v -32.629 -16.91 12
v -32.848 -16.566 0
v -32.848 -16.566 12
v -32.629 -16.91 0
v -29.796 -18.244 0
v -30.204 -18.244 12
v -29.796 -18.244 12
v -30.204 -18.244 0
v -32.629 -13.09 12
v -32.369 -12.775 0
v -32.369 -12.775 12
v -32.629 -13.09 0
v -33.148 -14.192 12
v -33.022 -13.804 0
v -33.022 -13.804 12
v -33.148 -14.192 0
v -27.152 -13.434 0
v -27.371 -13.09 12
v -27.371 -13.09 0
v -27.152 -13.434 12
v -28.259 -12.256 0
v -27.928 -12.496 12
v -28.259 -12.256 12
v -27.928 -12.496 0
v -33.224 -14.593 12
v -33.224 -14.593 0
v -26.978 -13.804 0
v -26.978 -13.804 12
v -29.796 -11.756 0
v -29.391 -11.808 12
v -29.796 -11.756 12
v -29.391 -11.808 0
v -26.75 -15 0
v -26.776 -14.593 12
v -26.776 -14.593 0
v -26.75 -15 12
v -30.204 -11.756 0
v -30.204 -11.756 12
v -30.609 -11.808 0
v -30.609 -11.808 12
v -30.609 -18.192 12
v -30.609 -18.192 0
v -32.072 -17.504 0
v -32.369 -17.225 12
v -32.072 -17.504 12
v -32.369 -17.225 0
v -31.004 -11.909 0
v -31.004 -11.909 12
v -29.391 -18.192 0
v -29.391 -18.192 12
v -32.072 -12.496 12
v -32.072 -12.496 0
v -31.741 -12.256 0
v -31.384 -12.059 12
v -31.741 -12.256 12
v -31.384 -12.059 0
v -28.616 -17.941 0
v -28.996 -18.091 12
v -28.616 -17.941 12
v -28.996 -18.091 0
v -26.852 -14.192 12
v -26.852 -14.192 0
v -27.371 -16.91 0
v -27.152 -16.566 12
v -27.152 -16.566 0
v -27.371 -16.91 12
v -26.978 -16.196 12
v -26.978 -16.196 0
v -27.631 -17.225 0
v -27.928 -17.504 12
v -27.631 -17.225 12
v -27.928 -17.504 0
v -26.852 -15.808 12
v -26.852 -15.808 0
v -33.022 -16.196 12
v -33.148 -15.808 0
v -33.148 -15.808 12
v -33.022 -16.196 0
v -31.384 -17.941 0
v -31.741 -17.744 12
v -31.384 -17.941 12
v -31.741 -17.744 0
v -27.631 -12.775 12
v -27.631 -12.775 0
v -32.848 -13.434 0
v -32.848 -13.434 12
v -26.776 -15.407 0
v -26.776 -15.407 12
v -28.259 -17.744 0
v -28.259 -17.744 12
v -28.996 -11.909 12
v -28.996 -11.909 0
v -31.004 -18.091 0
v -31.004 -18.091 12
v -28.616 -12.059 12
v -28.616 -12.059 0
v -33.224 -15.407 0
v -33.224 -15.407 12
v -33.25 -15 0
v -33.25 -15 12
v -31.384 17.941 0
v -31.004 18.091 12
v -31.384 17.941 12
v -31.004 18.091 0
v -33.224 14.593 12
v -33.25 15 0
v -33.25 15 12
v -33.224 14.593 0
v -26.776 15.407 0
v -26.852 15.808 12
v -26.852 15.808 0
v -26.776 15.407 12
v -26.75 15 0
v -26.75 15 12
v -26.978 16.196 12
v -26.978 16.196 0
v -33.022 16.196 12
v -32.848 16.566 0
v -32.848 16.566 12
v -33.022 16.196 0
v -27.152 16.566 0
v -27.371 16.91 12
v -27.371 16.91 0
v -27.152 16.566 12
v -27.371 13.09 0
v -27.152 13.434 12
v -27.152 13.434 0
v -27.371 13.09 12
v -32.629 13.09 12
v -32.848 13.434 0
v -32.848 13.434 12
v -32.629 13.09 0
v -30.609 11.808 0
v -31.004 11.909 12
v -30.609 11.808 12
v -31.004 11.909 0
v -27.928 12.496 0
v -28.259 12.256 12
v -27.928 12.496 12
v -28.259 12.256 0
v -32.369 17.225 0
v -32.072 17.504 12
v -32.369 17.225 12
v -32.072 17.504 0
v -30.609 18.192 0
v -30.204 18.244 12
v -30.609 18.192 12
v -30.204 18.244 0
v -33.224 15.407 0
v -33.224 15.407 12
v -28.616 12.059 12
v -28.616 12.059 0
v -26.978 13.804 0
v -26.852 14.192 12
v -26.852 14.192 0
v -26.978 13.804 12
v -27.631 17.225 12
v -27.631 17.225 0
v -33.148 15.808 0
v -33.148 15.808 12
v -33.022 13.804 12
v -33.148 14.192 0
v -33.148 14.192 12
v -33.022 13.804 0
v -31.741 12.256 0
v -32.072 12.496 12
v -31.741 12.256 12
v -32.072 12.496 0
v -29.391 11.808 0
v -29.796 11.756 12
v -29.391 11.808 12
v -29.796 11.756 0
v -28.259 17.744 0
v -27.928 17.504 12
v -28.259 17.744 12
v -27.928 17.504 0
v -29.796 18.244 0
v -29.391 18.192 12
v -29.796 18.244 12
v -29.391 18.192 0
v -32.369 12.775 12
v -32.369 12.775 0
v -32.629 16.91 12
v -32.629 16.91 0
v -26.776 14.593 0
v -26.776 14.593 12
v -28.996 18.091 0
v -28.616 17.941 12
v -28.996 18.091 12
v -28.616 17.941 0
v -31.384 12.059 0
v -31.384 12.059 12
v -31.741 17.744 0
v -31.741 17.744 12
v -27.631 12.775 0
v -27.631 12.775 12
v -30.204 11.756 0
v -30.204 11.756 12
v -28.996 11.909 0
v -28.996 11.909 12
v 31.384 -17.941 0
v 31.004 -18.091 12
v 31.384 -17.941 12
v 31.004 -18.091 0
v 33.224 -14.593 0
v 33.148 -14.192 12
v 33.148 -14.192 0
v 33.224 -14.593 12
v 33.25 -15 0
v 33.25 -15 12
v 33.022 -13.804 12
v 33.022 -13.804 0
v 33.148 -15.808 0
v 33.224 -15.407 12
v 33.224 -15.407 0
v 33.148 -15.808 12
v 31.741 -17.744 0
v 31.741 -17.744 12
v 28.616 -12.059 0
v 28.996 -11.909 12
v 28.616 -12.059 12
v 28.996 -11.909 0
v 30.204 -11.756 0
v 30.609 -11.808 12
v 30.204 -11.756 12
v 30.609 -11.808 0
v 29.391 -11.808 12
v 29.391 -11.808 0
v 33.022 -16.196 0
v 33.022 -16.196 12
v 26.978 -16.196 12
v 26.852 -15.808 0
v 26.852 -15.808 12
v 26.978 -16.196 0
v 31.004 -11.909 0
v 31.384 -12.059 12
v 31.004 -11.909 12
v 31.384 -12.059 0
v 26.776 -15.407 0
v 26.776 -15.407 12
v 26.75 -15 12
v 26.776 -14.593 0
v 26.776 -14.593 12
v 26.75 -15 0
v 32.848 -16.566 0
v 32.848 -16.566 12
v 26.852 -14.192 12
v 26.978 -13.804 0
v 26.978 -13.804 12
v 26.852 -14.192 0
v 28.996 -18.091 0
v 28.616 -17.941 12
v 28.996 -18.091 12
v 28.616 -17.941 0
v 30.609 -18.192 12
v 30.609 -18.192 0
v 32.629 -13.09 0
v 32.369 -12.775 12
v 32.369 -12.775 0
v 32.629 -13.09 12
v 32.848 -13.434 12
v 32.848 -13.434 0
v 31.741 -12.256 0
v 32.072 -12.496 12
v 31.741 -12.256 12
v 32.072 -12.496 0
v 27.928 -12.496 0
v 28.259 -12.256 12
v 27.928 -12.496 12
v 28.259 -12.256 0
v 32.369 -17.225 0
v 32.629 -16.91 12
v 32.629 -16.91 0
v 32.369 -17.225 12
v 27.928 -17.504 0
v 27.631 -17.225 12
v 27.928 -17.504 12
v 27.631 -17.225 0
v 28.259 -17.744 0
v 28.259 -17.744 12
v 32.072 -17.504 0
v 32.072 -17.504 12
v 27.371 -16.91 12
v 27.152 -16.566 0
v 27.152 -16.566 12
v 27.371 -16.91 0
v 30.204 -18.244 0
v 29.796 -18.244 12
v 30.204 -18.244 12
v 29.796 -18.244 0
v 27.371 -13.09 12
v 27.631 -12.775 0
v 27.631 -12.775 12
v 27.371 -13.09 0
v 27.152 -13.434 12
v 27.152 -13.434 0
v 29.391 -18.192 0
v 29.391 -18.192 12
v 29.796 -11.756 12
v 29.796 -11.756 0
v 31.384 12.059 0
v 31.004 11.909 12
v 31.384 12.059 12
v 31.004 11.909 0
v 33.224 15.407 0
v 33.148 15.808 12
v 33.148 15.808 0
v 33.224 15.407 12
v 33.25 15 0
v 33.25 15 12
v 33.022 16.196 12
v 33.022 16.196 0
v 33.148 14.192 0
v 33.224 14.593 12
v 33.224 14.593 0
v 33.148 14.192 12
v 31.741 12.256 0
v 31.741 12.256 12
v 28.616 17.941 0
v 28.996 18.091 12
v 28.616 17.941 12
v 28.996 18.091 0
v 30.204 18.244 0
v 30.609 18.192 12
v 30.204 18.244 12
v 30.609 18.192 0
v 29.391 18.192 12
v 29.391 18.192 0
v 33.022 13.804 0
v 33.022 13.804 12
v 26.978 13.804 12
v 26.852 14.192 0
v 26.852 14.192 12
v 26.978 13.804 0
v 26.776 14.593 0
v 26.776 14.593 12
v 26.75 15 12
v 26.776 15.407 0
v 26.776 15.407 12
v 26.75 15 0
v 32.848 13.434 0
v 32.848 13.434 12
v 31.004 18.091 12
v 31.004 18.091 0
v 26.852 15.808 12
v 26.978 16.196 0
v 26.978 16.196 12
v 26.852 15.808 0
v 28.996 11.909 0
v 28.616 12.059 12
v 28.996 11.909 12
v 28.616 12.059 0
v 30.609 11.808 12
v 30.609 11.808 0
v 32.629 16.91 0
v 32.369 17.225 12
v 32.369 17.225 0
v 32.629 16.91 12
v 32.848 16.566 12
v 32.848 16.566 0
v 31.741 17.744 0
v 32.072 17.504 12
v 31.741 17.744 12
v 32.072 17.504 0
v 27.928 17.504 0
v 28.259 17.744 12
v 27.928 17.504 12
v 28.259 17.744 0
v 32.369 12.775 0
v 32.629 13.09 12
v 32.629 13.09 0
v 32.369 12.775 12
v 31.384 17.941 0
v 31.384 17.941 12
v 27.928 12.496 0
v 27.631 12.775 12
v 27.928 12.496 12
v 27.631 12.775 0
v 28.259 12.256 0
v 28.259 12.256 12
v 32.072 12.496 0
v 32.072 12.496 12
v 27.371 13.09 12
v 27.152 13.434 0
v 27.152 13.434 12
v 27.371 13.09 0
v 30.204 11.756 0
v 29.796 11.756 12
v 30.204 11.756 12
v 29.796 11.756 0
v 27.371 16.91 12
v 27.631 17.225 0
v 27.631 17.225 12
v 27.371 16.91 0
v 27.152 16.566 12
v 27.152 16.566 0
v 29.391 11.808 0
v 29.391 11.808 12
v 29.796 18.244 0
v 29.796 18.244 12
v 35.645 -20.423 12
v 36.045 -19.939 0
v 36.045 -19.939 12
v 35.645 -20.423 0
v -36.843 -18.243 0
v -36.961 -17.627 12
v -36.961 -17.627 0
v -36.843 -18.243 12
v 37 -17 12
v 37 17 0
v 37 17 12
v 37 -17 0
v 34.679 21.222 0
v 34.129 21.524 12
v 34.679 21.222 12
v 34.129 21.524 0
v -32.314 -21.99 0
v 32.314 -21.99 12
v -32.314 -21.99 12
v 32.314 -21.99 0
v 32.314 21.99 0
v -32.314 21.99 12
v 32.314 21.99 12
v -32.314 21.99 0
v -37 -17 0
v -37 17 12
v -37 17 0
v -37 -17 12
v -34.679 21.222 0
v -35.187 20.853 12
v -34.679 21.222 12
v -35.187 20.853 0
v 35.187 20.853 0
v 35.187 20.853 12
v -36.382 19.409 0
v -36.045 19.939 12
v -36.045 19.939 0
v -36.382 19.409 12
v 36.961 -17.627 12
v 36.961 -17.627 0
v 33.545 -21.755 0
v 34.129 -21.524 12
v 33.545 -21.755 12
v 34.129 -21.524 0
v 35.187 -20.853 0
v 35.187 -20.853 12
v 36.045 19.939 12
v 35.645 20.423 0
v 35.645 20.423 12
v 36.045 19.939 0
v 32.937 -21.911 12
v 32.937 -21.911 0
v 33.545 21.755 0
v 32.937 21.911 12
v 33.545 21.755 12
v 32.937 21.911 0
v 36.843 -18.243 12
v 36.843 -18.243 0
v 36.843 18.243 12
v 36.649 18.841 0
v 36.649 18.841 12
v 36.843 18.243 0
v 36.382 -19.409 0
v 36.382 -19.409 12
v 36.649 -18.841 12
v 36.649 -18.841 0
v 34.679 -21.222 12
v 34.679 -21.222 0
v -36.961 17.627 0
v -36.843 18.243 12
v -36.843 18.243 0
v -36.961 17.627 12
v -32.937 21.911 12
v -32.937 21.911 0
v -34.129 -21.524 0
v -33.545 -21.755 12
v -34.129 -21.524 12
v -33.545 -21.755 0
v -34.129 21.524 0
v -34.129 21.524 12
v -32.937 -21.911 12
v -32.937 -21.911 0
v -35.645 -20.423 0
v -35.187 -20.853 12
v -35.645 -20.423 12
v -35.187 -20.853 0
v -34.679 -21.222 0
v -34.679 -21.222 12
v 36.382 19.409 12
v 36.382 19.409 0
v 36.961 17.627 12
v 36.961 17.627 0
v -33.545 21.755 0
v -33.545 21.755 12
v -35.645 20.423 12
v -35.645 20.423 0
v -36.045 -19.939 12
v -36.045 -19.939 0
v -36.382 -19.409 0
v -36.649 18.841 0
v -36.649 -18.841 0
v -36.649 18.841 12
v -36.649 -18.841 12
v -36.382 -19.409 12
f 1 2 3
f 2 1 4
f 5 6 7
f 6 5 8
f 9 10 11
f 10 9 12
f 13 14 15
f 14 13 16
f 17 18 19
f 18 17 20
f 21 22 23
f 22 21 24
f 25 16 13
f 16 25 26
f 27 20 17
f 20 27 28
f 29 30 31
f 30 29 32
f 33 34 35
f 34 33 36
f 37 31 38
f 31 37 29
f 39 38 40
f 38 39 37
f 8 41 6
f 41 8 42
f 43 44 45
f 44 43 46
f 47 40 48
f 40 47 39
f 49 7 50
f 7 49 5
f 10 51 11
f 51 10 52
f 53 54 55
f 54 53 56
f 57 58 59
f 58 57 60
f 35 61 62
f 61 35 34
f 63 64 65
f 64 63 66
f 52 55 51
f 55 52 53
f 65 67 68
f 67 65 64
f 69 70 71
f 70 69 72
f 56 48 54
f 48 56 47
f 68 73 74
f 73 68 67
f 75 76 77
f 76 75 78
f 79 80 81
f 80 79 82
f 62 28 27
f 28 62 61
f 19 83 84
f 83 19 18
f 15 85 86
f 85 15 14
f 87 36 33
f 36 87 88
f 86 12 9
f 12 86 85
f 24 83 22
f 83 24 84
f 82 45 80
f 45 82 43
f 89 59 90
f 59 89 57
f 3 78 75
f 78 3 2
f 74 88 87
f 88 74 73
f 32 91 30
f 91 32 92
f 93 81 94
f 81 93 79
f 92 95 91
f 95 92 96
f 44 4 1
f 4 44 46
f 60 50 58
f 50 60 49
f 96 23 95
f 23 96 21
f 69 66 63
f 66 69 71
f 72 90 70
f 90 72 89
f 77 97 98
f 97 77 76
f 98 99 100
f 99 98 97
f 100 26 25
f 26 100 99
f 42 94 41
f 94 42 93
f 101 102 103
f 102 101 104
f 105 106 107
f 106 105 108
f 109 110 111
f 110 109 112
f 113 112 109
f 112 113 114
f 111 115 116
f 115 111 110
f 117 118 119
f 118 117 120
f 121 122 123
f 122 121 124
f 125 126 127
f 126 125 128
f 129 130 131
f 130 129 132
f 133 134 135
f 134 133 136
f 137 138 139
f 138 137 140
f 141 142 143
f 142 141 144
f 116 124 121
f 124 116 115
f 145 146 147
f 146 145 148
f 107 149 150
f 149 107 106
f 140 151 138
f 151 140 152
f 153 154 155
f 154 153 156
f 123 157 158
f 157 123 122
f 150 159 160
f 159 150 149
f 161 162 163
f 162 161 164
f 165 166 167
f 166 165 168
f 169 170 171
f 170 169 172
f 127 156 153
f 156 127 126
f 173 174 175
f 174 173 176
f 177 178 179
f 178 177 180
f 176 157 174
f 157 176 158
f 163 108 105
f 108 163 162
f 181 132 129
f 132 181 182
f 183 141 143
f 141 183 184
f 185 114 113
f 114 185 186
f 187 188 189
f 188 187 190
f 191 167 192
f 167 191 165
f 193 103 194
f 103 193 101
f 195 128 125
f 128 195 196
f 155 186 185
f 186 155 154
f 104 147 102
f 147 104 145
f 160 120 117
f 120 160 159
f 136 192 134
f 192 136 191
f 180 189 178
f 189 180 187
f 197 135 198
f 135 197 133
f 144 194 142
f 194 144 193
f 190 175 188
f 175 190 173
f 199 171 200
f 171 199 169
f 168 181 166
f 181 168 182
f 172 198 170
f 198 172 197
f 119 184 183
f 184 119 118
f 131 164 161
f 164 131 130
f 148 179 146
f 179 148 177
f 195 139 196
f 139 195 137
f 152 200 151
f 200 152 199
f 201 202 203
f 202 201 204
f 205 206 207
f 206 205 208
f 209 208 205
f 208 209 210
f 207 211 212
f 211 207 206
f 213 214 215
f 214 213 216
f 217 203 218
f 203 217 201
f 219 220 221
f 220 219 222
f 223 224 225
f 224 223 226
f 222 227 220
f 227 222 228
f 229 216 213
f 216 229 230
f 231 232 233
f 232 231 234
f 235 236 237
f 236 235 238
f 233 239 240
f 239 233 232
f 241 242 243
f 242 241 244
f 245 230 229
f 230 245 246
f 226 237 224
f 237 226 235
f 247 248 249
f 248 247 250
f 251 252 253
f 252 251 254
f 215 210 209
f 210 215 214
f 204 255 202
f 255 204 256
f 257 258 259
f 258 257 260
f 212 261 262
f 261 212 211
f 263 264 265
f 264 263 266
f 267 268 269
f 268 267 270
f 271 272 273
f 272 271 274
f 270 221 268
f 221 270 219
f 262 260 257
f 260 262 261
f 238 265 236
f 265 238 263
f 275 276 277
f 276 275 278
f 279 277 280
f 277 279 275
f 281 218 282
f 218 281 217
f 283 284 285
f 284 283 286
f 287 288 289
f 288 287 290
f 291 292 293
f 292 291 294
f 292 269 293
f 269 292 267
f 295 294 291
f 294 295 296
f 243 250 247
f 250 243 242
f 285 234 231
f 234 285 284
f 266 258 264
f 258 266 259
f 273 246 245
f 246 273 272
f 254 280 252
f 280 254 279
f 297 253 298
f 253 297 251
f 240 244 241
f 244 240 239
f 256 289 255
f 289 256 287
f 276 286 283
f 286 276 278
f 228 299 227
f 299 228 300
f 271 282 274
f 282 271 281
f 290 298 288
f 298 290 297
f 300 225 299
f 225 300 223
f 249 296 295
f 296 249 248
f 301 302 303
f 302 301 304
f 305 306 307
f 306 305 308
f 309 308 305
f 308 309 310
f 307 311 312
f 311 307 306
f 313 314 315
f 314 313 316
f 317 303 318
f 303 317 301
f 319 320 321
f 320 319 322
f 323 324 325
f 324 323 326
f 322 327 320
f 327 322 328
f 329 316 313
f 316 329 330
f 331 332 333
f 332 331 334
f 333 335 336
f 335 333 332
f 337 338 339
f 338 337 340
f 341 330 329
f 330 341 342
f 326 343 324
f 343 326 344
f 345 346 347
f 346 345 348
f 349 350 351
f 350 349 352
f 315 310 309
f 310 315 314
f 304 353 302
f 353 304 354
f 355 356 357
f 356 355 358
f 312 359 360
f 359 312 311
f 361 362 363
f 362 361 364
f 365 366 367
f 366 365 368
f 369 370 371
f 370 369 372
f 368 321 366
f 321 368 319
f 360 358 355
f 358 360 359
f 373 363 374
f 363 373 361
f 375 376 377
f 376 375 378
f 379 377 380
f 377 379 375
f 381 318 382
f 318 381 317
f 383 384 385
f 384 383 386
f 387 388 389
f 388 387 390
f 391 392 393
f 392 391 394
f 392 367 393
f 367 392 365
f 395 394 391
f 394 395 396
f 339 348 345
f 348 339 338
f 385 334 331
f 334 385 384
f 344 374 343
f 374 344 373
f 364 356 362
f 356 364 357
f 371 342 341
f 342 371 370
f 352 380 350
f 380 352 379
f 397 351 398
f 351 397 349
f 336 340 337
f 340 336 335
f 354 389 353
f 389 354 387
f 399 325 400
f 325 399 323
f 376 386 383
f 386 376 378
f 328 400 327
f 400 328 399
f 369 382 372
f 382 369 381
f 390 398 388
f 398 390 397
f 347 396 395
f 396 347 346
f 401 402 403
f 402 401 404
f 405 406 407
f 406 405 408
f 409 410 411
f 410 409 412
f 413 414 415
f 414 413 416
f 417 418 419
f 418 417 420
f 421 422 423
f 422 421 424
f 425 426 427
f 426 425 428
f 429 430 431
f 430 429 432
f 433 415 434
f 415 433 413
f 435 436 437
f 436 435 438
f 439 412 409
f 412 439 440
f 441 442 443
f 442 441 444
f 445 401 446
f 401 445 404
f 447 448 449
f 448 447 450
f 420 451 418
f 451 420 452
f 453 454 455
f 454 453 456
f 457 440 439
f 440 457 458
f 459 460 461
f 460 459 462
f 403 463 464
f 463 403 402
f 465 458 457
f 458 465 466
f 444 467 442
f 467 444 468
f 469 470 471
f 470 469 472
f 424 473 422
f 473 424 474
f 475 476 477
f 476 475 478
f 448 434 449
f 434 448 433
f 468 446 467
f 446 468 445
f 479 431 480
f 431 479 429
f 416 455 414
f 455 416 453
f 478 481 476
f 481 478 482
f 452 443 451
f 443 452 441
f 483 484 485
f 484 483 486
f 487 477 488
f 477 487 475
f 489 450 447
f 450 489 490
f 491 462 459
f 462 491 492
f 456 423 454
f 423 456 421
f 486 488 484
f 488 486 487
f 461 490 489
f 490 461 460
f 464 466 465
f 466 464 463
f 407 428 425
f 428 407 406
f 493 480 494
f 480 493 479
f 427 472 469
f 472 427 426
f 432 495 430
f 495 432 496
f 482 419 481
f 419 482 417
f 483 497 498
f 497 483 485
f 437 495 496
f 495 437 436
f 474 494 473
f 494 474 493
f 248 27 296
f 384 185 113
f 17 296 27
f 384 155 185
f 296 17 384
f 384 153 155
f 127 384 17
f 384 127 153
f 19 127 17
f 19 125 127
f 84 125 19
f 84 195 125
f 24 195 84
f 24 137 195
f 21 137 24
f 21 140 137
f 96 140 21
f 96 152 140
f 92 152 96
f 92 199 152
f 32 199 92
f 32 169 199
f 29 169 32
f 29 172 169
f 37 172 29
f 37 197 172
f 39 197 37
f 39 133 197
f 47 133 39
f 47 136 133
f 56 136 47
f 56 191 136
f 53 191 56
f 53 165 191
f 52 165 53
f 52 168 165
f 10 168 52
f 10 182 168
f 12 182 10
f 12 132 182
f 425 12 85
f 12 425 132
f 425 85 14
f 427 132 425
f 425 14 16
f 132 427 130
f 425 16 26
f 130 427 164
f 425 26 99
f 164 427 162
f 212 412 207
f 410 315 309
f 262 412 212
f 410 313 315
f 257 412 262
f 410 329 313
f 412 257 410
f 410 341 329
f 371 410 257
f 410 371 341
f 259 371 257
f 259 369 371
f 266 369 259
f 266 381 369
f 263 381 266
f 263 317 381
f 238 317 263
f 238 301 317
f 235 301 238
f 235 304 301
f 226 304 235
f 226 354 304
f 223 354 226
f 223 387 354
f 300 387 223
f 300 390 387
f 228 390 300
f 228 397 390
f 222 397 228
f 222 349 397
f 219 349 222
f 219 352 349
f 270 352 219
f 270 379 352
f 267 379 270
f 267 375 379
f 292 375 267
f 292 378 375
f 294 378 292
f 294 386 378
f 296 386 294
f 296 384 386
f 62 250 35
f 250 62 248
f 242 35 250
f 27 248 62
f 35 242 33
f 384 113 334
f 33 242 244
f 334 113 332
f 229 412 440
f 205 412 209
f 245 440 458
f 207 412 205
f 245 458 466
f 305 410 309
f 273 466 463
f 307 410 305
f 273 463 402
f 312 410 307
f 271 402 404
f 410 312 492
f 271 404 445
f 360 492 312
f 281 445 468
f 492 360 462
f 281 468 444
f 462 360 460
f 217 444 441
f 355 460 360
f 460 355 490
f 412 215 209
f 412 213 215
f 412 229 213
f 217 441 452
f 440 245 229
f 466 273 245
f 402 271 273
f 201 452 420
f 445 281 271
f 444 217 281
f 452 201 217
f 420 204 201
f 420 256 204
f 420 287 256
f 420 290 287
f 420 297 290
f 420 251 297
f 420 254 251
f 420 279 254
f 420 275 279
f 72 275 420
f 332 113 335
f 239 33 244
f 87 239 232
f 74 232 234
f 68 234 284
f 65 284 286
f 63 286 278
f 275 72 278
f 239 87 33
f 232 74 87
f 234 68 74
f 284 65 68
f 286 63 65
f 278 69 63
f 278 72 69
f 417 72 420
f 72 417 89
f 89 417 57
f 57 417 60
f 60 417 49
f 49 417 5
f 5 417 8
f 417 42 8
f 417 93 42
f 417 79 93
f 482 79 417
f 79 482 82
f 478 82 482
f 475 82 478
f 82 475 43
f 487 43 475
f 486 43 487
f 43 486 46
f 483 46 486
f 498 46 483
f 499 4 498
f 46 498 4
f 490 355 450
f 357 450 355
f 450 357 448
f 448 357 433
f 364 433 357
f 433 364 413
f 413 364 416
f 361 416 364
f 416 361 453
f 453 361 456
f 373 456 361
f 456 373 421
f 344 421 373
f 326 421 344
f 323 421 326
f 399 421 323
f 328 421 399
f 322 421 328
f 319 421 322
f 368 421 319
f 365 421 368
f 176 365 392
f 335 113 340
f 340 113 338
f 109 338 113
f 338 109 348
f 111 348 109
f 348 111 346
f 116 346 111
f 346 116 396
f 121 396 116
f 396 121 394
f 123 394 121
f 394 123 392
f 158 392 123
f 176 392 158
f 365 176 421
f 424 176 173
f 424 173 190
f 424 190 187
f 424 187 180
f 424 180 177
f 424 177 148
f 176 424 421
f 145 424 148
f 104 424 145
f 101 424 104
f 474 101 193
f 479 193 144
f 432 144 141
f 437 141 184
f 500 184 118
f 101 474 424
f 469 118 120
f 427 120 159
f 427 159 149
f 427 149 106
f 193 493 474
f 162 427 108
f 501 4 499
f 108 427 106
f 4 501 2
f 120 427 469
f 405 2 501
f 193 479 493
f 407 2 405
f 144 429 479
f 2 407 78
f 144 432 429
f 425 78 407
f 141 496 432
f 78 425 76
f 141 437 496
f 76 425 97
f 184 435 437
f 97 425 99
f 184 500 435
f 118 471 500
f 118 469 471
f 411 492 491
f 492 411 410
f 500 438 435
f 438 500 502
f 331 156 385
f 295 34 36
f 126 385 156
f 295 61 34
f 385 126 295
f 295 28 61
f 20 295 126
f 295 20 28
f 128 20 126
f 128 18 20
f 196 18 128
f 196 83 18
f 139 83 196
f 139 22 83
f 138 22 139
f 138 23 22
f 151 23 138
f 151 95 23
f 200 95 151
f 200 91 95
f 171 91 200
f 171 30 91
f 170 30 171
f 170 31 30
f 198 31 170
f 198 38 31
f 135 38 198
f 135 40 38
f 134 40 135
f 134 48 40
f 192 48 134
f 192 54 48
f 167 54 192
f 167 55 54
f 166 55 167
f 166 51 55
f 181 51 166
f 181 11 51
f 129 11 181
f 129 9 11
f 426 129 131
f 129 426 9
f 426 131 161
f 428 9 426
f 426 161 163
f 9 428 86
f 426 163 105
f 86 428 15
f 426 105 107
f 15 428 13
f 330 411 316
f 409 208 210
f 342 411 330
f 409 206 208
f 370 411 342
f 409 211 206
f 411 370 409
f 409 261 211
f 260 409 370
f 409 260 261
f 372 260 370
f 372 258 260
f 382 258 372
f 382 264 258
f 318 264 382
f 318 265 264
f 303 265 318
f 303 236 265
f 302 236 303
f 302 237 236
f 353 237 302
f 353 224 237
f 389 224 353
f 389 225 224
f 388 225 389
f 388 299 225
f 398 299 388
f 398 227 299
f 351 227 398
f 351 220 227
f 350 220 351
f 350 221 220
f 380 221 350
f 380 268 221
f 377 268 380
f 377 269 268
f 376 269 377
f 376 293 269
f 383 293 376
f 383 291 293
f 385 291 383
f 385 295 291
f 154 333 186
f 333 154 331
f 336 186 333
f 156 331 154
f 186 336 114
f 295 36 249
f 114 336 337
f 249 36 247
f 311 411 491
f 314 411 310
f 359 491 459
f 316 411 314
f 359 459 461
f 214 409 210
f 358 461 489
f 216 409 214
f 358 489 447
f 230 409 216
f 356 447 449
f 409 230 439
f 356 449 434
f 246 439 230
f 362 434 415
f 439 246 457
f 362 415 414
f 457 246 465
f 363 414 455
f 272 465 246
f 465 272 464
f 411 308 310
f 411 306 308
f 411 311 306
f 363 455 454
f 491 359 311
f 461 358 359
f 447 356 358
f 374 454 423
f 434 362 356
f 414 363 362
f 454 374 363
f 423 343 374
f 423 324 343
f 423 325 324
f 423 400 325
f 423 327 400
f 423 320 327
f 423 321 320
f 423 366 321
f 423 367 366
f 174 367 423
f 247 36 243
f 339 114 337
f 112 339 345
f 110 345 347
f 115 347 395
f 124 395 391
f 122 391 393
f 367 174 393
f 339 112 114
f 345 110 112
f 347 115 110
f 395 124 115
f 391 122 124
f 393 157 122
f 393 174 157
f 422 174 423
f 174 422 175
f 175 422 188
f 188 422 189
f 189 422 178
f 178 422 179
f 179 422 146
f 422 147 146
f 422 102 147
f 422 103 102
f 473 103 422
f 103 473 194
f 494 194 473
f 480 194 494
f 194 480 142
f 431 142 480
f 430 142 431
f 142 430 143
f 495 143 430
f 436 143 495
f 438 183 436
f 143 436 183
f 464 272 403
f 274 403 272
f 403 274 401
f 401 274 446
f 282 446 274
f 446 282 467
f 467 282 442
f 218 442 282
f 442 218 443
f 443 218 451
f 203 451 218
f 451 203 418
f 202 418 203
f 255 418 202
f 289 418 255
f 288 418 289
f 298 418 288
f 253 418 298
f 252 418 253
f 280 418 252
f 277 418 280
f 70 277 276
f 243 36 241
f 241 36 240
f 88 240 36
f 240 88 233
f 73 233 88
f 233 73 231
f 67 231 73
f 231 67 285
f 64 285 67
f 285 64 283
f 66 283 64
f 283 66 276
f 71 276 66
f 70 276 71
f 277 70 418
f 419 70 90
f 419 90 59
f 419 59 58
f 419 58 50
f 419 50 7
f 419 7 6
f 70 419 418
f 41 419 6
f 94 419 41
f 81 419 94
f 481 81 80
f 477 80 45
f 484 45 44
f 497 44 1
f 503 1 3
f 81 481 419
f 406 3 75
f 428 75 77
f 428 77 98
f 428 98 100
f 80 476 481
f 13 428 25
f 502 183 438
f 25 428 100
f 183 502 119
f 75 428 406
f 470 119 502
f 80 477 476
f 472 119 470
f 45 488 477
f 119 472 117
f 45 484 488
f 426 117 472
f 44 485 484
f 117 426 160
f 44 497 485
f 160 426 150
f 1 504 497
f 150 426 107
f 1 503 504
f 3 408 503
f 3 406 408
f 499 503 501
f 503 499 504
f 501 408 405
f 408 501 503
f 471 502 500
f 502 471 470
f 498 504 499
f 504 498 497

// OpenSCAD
$fn = 50;


difference() {
	union() {
		hull() {
			translate(v = [-32.0000000000, 17.0000000000, 0]) {
				cylinder(h = 12, r = 5);
			}
			translate(v = [32.0000000000, 17.0000000000, 0]) {
				cylinder(h = 12, r = 5);
			}
			translate(v = [-32.0000000000, -17.0000000000, 0]) {
				cylinder(h = 12, r = 5);
			}
			translate(v = [32.0000000000, -17.0000000000, 0]) {
				cylinder(h = 12, r = 5);
			}
		}
	}
	union() {
		translate(v = [-30.0000000000, -15.0000000000, -100.0000000000]) {
			cylinder(h = 200, r = 3.2500000000);
		}
		translate(v = [-30.0000000000, 15.0000000000, -100.0000000000]) {
			cylinder(h = 200, r = 3.2500000000);
		}
		translate(v = [30.0000000000, -15.0000000000, -100.0000000000]) {
			cylinder(h = 200, r = 3.2500000000);
		}
		translate(v = [30.0000000000, 15.0000000000, -100.0000000000]) {
			cylinder(h = 200, r = 3.2500000000);
		}
	}
}
